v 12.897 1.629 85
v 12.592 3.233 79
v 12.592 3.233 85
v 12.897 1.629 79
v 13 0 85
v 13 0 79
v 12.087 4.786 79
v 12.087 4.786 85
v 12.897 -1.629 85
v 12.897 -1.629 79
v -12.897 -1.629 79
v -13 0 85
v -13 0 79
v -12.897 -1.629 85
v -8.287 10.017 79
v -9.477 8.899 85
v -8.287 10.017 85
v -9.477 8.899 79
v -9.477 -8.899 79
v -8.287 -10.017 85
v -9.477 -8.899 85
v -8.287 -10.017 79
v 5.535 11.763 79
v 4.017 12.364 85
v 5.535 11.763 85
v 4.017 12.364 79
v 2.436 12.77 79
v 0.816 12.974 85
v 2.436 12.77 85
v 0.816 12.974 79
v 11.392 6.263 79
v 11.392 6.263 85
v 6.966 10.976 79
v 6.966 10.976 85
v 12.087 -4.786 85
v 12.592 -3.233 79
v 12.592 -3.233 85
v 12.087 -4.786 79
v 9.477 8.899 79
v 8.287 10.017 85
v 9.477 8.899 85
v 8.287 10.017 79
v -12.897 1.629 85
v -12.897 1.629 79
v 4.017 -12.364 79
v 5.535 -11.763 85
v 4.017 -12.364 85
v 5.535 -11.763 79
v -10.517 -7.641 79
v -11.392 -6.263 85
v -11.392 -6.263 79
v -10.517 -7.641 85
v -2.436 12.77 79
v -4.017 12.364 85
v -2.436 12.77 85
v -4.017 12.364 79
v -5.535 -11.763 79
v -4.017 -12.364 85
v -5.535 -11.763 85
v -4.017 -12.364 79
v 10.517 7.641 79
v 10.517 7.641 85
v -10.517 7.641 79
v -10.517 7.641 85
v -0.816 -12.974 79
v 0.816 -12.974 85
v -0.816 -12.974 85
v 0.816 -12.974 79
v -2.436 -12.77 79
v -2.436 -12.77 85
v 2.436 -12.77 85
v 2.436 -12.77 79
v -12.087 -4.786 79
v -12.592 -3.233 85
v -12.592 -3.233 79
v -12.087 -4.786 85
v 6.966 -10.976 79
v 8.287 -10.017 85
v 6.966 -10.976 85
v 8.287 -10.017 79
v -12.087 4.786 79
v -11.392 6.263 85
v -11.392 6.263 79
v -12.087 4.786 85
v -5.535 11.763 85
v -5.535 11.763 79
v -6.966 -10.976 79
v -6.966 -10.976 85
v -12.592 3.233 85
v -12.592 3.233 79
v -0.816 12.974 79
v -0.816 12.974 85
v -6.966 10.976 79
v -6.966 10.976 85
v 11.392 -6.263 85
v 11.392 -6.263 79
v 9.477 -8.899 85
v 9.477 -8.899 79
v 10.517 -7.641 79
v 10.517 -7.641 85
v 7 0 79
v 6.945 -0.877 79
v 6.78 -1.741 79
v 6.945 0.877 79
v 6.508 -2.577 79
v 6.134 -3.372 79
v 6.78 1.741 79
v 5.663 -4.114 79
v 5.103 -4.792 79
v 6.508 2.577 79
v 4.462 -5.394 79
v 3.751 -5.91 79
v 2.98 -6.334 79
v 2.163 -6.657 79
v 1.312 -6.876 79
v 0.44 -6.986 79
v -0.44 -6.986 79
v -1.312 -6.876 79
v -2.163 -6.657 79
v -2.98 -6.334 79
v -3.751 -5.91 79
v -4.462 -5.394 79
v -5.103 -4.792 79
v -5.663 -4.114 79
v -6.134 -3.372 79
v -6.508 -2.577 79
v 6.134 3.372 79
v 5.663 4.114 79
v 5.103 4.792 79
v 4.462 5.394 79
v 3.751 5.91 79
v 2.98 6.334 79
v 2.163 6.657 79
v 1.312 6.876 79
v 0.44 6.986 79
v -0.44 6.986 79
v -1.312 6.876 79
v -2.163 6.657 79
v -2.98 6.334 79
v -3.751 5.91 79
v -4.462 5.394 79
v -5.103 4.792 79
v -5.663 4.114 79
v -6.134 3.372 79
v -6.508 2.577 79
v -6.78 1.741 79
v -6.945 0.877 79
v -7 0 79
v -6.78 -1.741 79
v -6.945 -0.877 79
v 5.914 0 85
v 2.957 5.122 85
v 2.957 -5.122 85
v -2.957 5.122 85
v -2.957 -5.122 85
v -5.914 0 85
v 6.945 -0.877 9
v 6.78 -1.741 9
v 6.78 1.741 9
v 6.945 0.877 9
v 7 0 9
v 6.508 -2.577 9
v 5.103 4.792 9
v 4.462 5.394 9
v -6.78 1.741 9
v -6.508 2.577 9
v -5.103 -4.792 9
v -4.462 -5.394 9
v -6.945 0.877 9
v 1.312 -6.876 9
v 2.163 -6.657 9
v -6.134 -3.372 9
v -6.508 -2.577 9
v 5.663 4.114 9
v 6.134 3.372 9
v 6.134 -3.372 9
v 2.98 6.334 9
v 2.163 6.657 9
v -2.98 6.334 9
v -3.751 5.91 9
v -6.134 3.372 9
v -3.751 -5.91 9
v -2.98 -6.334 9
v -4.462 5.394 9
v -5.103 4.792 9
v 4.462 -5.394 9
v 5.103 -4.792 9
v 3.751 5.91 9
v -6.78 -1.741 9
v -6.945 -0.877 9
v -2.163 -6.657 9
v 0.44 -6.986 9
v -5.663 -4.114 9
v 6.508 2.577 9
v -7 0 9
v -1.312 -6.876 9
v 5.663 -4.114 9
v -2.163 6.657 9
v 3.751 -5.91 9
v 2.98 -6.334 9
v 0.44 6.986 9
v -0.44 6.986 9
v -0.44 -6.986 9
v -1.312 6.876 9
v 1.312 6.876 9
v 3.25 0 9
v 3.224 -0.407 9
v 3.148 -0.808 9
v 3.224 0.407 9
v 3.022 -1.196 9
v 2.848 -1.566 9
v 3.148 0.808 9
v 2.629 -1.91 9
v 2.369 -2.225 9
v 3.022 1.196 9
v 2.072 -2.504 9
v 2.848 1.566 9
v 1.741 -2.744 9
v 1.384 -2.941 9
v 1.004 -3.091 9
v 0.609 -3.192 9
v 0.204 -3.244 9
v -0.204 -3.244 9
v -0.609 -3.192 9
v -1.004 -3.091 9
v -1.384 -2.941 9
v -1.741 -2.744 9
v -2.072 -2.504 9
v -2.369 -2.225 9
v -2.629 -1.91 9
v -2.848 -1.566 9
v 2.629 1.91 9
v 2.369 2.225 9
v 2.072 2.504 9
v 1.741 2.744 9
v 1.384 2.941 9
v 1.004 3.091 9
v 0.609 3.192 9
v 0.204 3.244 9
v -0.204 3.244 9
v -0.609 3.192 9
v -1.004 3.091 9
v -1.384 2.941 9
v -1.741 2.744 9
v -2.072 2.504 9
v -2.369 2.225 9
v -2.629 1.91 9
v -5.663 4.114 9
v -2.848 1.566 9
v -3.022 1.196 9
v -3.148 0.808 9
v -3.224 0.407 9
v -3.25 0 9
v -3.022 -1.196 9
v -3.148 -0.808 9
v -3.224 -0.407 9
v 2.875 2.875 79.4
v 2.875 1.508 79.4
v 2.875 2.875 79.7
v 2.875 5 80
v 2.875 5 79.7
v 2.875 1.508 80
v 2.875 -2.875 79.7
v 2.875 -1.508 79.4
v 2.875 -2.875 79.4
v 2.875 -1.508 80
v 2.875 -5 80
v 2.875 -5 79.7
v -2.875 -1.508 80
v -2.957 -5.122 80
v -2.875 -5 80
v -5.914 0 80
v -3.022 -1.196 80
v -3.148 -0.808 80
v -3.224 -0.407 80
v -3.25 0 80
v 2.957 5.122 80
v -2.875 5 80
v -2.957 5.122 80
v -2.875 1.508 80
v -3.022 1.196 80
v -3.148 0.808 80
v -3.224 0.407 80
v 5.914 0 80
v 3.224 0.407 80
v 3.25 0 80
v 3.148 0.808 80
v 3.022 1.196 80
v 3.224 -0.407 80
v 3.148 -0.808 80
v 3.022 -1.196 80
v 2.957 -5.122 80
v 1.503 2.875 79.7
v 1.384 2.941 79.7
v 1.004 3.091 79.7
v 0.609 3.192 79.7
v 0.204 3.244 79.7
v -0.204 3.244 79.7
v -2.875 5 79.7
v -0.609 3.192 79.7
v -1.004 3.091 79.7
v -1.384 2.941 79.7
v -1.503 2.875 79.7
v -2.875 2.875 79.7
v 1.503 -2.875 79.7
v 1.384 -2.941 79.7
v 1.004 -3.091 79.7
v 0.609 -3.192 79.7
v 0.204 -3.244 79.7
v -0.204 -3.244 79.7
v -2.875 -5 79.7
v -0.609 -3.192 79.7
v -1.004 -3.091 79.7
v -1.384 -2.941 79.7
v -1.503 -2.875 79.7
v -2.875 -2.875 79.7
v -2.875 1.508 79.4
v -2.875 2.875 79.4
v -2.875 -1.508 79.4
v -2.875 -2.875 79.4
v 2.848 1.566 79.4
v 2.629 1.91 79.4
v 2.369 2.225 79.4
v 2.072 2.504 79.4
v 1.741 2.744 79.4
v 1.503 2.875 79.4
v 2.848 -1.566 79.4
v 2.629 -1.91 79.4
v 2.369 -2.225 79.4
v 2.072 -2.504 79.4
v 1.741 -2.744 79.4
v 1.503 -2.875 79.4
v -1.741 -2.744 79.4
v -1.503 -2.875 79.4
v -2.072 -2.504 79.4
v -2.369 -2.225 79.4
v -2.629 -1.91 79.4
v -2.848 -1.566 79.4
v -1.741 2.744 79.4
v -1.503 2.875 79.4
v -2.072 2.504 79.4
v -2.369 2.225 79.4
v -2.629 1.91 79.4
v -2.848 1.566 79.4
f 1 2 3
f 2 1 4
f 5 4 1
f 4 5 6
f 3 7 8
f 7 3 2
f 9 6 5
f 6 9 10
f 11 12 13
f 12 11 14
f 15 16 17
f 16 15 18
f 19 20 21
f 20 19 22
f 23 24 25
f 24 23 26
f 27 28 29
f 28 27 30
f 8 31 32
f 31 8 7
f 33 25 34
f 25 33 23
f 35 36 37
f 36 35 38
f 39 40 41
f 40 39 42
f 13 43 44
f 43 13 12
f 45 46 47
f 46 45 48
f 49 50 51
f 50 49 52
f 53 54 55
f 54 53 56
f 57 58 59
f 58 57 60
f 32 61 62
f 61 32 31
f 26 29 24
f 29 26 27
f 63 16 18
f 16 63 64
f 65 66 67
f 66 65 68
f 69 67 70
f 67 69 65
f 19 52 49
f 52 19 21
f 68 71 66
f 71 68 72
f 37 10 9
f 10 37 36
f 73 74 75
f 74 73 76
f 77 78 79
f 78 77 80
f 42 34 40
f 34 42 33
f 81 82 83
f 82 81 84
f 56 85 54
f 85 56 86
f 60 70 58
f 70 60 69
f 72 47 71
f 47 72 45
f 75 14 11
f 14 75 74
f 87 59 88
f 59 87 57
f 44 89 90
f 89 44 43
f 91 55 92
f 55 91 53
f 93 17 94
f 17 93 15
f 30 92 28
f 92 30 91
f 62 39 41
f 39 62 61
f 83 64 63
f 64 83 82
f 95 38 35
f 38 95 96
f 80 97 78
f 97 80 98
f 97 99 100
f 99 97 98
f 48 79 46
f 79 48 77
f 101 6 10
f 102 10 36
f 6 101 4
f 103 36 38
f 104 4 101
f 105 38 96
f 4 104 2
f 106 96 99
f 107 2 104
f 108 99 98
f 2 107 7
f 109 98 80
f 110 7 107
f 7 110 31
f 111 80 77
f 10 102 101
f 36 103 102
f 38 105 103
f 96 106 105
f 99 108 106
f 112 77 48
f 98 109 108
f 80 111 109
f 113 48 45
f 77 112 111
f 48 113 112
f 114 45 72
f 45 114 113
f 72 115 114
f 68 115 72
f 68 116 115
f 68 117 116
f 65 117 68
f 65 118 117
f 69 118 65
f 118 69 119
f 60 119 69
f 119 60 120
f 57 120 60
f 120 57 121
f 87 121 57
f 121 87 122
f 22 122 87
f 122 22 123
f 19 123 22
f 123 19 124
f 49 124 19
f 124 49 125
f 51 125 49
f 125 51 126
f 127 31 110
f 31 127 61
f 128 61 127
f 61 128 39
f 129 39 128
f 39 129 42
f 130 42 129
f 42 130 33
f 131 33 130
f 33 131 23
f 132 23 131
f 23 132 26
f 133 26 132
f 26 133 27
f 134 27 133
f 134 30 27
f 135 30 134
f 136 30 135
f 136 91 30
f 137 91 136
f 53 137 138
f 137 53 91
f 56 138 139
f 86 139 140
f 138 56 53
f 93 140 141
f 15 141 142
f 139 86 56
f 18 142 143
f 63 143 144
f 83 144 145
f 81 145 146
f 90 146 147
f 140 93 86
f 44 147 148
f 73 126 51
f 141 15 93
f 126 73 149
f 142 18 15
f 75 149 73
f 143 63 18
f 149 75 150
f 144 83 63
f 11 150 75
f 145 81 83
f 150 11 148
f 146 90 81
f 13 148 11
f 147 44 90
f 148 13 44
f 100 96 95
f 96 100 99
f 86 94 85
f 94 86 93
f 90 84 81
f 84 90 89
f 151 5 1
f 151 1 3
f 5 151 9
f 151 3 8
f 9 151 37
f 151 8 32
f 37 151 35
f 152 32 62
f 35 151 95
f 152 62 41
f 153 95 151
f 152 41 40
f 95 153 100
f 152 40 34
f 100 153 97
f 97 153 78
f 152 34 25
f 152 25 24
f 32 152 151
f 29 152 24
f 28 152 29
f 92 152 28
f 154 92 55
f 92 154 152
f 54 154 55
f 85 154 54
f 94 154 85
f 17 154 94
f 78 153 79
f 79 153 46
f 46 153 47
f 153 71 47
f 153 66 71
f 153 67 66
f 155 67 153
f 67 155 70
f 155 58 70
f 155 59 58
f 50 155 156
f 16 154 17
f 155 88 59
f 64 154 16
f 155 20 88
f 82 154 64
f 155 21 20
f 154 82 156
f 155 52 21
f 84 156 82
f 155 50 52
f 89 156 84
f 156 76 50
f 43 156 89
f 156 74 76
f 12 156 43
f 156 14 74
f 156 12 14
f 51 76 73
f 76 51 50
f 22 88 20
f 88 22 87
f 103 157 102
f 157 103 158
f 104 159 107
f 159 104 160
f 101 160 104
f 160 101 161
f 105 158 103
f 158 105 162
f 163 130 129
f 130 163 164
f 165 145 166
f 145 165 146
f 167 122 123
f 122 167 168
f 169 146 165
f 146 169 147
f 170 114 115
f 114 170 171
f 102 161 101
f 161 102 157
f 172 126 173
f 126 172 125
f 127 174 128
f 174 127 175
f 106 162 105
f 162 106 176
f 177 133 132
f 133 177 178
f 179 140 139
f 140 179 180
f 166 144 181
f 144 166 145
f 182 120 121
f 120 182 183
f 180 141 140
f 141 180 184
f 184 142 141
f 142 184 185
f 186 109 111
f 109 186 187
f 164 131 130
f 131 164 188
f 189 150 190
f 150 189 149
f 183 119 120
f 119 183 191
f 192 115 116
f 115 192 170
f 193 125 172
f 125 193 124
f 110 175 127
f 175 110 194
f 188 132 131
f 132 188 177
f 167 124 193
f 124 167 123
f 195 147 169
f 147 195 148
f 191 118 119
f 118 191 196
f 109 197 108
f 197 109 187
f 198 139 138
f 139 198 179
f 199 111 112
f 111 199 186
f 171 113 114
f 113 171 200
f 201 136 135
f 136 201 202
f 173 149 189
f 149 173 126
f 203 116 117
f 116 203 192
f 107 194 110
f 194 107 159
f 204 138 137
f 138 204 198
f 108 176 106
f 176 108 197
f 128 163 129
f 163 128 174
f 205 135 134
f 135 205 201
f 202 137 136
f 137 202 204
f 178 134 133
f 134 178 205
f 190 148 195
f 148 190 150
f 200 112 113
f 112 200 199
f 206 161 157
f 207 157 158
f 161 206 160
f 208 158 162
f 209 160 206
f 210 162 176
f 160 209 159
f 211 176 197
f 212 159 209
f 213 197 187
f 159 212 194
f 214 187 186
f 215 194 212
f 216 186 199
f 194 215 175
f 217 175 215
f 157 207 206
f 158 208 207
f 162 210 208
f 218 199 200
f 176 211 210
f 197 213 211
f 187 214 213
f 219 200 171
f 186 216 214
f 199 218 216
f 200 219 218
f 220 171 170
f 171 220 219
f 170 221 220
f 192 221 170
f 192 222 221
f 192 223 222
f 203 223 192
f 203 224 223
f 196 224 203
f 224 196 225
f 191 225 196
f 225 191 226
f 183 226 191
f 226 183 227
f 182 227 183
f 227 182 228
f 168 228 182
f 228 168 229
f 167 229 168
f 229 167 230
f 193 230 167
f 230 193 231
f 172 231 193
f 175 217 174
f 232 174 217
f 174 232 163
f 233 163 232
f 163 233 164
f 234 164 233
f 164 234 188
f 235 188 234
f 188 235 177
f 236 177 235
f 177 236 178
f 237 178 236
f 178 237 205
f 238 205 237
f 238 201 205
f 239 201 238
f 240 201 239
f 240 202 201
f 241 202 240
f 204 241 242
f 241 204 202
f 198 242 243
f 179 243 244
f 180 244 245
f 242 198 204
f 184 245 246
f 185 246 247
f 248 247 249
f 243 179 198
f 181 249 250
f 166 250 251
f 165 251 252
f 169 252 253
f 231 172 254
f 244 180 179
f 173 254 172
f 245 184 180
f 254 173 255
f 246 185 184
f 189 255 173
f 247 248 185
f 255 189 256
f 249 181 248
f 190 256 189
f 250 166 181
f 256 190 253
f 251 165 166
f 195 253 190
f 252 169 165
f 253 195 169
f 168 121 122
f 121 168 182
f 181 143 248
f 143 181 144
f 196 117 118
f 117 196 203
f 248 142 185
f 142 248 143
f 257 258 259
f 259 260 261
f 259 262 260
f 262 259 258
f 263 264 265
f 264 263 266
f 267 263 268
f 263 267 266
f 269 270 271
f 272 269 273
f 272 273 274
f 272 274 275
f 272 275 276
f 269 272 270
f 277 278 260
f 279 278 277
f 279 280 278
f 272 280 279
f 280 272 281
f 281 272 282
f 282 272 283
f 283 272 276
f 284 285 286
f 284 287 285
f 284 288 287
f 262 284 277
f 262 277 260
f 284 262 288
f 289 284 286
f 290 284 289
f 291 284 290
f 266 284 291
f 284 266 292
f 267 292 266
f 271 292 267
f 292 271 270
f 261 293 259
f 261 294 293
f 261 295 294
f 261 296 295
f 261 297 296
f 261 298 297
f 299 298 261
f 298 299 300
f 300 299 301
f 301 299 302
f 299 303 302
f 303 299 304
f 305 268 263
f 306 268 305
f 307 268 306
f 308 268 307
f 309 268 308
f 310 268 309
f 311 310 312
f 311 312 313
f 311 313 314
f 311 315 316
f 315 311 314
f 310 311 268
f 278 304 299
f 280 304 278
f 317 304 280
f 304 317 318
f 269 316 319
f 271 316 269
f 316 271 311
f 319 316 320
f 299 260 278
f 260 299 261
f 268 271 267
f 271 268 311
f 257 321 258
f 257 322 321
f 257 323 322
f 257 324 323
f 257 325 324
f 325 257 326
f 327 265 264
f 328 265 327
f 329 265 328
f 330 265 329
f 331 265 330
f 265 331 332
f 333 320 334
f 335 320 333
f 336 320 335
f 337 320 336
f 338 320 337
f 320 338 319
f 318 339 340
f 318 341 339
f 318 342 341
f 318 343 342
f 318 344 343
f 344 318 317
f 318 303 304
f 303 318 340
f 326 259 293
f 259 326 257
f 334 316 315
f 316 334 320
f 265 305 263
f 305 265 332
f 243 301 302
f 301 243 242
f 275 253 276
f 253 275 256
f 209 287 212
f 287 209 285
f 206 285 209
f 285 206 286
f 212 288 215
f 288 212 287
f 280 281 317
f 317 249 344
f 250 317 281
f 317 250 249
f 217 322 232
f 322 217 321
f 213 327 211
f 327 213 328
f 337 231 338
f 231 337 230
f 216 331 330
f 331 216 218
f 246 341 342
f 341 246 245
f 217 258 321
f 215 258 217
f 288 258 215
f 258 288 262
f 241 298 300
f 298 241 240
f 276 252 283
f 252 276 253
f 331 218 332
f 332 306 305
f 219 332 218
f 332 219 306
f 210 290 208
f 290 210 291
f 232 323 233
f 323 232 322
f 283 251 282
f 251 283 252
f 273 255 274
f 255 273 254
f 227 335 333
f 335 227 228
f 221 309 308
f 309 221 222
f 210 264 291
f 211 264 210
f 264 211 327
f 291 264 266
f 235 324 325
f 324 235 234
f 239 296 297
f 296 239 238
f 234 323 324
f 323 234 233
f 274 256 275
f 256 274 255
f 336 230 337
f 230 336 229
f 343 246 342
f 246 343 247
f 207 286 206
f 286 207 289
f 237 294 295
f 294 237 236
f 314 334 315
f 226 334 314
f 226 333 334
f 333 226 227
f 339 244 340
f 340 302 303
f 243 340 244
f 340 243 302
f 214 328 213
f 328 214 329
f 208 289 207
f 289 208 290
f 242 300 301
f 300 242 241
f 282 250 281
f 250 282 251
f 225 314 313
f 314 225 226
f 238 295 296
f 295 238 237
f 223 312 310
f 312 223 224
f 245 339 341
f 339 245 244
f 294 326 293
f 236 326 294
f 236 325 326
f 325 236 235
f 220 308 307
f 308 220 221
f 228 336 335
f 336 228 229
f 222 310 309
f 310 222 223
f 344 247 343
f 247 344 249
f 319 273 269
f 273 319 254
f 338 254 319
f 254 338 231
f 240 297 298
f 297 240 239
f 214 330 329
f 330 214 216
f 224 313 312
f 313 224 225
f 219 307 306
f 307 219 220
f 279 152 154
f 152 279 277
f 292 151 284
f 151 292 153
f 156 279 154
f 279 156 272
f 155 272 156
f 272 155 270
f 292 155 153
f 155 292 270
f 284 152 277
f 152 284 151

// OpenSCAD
$fn = 50;


difference() {
	union() {
		translate(v = [0, 0, 79.0000000000]) {
			cylinder(h = 6, r = 13.0000000000);
		}
		translate(v = [0, 0, 9.0000000000]) {
			cylinder(h = 76, r = 7.0000000000);
		}
	}
	union() {
		translate(v = [0, 0, 85]) {
			rotate(a = [0, 0, 0]) {
				difference() {
					union() {
						#translate(v = [-2.8750000000, -5.0000000000, -5.3000000000]) {
							cube(size = [5.7500000000, 10, 0.3000000000]);
						}
						#translate(v = [-2.8750000000, -2.8750000000, -5.6000000000]) {
							cube(size = [5.7500000000, 5.7500000000, 0.3000000000]);
						}
						#translate(v = [-2.8750000000, -5.0000000000, 0]) {
							cube(size = [5.7500000000, 10, 0.3000000000]);
						}
						#translate(v = [-2.8750000000, -2.8750000000, 0.3000000000]) {
							cube(size = [5.7500000000, 5.7500000000, 0.3000000000]);
						}
						#translate(v = [0, 0, -100.0000000000]) {
							cylinder(h = 200, r = 3.2500000000);
						}
						translate(v = [0, 0, -5]) {
							#linear_extrude(height = 5) {
								polygon(points = [[5.9142500000, 0.0000000000], [2.9571250000, 5.1218907443], [-2.9571250000, 5.1218907443], [-5.9142500000, 0.0000000000], [-2.9571250000, -5.1218907443], [2.9571250000, -5.1218907443]]);
							}
						}
						#translate(v = [-2.8750000000, -5.0000000000, -5.3000000000]) {
							cube(size = [5.7500000000, 10, 0.3000000000]);
						}
						#translate(v = [-2.8750000000, -2.8750000000, -5.6000000000]) {
							cube(size = [5.7500000000, 5.7500000000, 0.3000000000]);
						}
						#translate(v = [-2.8750000000, -5.0000000000, 0]) {
							cube(size = [5.7500000000, 10, 0.3000000000]);
						}
						#translate(v = [-2.8750000000, -2.8750000000, 0.3000000000]) {
							cube(size = [5.7500000000, 5.7500000000, 0.3000000000]);
						}
						#translate(v = [0, 0, -100.0000000000]) {
							cylinder(h = 200, r = 3.2500000000);
						}
						#translate(v = [-2.8750000000, -5.0000000000, -5.3000000000]) {
							cube(size = [5.7500000000, 10, 0.3000000000]);
						}
						#translate(v = [-2.8750000000, -2.8750000000, -5.6000000000]) {
							cube(size = [5.7500000000, 5.7500000000, 0.3000000000]);
						}
						#translate(v = [-2.8750000000, -5.0000000000, 0]) {
							cube(size = [5.7500000000, 10, 0.3000000000]);
						}
						#translate(v = [-2.8750000000, -2.8750000000, 0.3000000000]) {
							cube(size = [5.7500000000, 5.7500000000, 0.3000000000]);
						}
						#translate(v = [0, 0, -100.0000000000]) {
							cylinder(h = 200, r = 3.2500000000);
						}
					}
					union();
				}
			}
		}
		#translate(v = [0, 0, -100.0000000000]) {
			cylinder(h = 200, r = 3.2500000000);
		}
	}
}
